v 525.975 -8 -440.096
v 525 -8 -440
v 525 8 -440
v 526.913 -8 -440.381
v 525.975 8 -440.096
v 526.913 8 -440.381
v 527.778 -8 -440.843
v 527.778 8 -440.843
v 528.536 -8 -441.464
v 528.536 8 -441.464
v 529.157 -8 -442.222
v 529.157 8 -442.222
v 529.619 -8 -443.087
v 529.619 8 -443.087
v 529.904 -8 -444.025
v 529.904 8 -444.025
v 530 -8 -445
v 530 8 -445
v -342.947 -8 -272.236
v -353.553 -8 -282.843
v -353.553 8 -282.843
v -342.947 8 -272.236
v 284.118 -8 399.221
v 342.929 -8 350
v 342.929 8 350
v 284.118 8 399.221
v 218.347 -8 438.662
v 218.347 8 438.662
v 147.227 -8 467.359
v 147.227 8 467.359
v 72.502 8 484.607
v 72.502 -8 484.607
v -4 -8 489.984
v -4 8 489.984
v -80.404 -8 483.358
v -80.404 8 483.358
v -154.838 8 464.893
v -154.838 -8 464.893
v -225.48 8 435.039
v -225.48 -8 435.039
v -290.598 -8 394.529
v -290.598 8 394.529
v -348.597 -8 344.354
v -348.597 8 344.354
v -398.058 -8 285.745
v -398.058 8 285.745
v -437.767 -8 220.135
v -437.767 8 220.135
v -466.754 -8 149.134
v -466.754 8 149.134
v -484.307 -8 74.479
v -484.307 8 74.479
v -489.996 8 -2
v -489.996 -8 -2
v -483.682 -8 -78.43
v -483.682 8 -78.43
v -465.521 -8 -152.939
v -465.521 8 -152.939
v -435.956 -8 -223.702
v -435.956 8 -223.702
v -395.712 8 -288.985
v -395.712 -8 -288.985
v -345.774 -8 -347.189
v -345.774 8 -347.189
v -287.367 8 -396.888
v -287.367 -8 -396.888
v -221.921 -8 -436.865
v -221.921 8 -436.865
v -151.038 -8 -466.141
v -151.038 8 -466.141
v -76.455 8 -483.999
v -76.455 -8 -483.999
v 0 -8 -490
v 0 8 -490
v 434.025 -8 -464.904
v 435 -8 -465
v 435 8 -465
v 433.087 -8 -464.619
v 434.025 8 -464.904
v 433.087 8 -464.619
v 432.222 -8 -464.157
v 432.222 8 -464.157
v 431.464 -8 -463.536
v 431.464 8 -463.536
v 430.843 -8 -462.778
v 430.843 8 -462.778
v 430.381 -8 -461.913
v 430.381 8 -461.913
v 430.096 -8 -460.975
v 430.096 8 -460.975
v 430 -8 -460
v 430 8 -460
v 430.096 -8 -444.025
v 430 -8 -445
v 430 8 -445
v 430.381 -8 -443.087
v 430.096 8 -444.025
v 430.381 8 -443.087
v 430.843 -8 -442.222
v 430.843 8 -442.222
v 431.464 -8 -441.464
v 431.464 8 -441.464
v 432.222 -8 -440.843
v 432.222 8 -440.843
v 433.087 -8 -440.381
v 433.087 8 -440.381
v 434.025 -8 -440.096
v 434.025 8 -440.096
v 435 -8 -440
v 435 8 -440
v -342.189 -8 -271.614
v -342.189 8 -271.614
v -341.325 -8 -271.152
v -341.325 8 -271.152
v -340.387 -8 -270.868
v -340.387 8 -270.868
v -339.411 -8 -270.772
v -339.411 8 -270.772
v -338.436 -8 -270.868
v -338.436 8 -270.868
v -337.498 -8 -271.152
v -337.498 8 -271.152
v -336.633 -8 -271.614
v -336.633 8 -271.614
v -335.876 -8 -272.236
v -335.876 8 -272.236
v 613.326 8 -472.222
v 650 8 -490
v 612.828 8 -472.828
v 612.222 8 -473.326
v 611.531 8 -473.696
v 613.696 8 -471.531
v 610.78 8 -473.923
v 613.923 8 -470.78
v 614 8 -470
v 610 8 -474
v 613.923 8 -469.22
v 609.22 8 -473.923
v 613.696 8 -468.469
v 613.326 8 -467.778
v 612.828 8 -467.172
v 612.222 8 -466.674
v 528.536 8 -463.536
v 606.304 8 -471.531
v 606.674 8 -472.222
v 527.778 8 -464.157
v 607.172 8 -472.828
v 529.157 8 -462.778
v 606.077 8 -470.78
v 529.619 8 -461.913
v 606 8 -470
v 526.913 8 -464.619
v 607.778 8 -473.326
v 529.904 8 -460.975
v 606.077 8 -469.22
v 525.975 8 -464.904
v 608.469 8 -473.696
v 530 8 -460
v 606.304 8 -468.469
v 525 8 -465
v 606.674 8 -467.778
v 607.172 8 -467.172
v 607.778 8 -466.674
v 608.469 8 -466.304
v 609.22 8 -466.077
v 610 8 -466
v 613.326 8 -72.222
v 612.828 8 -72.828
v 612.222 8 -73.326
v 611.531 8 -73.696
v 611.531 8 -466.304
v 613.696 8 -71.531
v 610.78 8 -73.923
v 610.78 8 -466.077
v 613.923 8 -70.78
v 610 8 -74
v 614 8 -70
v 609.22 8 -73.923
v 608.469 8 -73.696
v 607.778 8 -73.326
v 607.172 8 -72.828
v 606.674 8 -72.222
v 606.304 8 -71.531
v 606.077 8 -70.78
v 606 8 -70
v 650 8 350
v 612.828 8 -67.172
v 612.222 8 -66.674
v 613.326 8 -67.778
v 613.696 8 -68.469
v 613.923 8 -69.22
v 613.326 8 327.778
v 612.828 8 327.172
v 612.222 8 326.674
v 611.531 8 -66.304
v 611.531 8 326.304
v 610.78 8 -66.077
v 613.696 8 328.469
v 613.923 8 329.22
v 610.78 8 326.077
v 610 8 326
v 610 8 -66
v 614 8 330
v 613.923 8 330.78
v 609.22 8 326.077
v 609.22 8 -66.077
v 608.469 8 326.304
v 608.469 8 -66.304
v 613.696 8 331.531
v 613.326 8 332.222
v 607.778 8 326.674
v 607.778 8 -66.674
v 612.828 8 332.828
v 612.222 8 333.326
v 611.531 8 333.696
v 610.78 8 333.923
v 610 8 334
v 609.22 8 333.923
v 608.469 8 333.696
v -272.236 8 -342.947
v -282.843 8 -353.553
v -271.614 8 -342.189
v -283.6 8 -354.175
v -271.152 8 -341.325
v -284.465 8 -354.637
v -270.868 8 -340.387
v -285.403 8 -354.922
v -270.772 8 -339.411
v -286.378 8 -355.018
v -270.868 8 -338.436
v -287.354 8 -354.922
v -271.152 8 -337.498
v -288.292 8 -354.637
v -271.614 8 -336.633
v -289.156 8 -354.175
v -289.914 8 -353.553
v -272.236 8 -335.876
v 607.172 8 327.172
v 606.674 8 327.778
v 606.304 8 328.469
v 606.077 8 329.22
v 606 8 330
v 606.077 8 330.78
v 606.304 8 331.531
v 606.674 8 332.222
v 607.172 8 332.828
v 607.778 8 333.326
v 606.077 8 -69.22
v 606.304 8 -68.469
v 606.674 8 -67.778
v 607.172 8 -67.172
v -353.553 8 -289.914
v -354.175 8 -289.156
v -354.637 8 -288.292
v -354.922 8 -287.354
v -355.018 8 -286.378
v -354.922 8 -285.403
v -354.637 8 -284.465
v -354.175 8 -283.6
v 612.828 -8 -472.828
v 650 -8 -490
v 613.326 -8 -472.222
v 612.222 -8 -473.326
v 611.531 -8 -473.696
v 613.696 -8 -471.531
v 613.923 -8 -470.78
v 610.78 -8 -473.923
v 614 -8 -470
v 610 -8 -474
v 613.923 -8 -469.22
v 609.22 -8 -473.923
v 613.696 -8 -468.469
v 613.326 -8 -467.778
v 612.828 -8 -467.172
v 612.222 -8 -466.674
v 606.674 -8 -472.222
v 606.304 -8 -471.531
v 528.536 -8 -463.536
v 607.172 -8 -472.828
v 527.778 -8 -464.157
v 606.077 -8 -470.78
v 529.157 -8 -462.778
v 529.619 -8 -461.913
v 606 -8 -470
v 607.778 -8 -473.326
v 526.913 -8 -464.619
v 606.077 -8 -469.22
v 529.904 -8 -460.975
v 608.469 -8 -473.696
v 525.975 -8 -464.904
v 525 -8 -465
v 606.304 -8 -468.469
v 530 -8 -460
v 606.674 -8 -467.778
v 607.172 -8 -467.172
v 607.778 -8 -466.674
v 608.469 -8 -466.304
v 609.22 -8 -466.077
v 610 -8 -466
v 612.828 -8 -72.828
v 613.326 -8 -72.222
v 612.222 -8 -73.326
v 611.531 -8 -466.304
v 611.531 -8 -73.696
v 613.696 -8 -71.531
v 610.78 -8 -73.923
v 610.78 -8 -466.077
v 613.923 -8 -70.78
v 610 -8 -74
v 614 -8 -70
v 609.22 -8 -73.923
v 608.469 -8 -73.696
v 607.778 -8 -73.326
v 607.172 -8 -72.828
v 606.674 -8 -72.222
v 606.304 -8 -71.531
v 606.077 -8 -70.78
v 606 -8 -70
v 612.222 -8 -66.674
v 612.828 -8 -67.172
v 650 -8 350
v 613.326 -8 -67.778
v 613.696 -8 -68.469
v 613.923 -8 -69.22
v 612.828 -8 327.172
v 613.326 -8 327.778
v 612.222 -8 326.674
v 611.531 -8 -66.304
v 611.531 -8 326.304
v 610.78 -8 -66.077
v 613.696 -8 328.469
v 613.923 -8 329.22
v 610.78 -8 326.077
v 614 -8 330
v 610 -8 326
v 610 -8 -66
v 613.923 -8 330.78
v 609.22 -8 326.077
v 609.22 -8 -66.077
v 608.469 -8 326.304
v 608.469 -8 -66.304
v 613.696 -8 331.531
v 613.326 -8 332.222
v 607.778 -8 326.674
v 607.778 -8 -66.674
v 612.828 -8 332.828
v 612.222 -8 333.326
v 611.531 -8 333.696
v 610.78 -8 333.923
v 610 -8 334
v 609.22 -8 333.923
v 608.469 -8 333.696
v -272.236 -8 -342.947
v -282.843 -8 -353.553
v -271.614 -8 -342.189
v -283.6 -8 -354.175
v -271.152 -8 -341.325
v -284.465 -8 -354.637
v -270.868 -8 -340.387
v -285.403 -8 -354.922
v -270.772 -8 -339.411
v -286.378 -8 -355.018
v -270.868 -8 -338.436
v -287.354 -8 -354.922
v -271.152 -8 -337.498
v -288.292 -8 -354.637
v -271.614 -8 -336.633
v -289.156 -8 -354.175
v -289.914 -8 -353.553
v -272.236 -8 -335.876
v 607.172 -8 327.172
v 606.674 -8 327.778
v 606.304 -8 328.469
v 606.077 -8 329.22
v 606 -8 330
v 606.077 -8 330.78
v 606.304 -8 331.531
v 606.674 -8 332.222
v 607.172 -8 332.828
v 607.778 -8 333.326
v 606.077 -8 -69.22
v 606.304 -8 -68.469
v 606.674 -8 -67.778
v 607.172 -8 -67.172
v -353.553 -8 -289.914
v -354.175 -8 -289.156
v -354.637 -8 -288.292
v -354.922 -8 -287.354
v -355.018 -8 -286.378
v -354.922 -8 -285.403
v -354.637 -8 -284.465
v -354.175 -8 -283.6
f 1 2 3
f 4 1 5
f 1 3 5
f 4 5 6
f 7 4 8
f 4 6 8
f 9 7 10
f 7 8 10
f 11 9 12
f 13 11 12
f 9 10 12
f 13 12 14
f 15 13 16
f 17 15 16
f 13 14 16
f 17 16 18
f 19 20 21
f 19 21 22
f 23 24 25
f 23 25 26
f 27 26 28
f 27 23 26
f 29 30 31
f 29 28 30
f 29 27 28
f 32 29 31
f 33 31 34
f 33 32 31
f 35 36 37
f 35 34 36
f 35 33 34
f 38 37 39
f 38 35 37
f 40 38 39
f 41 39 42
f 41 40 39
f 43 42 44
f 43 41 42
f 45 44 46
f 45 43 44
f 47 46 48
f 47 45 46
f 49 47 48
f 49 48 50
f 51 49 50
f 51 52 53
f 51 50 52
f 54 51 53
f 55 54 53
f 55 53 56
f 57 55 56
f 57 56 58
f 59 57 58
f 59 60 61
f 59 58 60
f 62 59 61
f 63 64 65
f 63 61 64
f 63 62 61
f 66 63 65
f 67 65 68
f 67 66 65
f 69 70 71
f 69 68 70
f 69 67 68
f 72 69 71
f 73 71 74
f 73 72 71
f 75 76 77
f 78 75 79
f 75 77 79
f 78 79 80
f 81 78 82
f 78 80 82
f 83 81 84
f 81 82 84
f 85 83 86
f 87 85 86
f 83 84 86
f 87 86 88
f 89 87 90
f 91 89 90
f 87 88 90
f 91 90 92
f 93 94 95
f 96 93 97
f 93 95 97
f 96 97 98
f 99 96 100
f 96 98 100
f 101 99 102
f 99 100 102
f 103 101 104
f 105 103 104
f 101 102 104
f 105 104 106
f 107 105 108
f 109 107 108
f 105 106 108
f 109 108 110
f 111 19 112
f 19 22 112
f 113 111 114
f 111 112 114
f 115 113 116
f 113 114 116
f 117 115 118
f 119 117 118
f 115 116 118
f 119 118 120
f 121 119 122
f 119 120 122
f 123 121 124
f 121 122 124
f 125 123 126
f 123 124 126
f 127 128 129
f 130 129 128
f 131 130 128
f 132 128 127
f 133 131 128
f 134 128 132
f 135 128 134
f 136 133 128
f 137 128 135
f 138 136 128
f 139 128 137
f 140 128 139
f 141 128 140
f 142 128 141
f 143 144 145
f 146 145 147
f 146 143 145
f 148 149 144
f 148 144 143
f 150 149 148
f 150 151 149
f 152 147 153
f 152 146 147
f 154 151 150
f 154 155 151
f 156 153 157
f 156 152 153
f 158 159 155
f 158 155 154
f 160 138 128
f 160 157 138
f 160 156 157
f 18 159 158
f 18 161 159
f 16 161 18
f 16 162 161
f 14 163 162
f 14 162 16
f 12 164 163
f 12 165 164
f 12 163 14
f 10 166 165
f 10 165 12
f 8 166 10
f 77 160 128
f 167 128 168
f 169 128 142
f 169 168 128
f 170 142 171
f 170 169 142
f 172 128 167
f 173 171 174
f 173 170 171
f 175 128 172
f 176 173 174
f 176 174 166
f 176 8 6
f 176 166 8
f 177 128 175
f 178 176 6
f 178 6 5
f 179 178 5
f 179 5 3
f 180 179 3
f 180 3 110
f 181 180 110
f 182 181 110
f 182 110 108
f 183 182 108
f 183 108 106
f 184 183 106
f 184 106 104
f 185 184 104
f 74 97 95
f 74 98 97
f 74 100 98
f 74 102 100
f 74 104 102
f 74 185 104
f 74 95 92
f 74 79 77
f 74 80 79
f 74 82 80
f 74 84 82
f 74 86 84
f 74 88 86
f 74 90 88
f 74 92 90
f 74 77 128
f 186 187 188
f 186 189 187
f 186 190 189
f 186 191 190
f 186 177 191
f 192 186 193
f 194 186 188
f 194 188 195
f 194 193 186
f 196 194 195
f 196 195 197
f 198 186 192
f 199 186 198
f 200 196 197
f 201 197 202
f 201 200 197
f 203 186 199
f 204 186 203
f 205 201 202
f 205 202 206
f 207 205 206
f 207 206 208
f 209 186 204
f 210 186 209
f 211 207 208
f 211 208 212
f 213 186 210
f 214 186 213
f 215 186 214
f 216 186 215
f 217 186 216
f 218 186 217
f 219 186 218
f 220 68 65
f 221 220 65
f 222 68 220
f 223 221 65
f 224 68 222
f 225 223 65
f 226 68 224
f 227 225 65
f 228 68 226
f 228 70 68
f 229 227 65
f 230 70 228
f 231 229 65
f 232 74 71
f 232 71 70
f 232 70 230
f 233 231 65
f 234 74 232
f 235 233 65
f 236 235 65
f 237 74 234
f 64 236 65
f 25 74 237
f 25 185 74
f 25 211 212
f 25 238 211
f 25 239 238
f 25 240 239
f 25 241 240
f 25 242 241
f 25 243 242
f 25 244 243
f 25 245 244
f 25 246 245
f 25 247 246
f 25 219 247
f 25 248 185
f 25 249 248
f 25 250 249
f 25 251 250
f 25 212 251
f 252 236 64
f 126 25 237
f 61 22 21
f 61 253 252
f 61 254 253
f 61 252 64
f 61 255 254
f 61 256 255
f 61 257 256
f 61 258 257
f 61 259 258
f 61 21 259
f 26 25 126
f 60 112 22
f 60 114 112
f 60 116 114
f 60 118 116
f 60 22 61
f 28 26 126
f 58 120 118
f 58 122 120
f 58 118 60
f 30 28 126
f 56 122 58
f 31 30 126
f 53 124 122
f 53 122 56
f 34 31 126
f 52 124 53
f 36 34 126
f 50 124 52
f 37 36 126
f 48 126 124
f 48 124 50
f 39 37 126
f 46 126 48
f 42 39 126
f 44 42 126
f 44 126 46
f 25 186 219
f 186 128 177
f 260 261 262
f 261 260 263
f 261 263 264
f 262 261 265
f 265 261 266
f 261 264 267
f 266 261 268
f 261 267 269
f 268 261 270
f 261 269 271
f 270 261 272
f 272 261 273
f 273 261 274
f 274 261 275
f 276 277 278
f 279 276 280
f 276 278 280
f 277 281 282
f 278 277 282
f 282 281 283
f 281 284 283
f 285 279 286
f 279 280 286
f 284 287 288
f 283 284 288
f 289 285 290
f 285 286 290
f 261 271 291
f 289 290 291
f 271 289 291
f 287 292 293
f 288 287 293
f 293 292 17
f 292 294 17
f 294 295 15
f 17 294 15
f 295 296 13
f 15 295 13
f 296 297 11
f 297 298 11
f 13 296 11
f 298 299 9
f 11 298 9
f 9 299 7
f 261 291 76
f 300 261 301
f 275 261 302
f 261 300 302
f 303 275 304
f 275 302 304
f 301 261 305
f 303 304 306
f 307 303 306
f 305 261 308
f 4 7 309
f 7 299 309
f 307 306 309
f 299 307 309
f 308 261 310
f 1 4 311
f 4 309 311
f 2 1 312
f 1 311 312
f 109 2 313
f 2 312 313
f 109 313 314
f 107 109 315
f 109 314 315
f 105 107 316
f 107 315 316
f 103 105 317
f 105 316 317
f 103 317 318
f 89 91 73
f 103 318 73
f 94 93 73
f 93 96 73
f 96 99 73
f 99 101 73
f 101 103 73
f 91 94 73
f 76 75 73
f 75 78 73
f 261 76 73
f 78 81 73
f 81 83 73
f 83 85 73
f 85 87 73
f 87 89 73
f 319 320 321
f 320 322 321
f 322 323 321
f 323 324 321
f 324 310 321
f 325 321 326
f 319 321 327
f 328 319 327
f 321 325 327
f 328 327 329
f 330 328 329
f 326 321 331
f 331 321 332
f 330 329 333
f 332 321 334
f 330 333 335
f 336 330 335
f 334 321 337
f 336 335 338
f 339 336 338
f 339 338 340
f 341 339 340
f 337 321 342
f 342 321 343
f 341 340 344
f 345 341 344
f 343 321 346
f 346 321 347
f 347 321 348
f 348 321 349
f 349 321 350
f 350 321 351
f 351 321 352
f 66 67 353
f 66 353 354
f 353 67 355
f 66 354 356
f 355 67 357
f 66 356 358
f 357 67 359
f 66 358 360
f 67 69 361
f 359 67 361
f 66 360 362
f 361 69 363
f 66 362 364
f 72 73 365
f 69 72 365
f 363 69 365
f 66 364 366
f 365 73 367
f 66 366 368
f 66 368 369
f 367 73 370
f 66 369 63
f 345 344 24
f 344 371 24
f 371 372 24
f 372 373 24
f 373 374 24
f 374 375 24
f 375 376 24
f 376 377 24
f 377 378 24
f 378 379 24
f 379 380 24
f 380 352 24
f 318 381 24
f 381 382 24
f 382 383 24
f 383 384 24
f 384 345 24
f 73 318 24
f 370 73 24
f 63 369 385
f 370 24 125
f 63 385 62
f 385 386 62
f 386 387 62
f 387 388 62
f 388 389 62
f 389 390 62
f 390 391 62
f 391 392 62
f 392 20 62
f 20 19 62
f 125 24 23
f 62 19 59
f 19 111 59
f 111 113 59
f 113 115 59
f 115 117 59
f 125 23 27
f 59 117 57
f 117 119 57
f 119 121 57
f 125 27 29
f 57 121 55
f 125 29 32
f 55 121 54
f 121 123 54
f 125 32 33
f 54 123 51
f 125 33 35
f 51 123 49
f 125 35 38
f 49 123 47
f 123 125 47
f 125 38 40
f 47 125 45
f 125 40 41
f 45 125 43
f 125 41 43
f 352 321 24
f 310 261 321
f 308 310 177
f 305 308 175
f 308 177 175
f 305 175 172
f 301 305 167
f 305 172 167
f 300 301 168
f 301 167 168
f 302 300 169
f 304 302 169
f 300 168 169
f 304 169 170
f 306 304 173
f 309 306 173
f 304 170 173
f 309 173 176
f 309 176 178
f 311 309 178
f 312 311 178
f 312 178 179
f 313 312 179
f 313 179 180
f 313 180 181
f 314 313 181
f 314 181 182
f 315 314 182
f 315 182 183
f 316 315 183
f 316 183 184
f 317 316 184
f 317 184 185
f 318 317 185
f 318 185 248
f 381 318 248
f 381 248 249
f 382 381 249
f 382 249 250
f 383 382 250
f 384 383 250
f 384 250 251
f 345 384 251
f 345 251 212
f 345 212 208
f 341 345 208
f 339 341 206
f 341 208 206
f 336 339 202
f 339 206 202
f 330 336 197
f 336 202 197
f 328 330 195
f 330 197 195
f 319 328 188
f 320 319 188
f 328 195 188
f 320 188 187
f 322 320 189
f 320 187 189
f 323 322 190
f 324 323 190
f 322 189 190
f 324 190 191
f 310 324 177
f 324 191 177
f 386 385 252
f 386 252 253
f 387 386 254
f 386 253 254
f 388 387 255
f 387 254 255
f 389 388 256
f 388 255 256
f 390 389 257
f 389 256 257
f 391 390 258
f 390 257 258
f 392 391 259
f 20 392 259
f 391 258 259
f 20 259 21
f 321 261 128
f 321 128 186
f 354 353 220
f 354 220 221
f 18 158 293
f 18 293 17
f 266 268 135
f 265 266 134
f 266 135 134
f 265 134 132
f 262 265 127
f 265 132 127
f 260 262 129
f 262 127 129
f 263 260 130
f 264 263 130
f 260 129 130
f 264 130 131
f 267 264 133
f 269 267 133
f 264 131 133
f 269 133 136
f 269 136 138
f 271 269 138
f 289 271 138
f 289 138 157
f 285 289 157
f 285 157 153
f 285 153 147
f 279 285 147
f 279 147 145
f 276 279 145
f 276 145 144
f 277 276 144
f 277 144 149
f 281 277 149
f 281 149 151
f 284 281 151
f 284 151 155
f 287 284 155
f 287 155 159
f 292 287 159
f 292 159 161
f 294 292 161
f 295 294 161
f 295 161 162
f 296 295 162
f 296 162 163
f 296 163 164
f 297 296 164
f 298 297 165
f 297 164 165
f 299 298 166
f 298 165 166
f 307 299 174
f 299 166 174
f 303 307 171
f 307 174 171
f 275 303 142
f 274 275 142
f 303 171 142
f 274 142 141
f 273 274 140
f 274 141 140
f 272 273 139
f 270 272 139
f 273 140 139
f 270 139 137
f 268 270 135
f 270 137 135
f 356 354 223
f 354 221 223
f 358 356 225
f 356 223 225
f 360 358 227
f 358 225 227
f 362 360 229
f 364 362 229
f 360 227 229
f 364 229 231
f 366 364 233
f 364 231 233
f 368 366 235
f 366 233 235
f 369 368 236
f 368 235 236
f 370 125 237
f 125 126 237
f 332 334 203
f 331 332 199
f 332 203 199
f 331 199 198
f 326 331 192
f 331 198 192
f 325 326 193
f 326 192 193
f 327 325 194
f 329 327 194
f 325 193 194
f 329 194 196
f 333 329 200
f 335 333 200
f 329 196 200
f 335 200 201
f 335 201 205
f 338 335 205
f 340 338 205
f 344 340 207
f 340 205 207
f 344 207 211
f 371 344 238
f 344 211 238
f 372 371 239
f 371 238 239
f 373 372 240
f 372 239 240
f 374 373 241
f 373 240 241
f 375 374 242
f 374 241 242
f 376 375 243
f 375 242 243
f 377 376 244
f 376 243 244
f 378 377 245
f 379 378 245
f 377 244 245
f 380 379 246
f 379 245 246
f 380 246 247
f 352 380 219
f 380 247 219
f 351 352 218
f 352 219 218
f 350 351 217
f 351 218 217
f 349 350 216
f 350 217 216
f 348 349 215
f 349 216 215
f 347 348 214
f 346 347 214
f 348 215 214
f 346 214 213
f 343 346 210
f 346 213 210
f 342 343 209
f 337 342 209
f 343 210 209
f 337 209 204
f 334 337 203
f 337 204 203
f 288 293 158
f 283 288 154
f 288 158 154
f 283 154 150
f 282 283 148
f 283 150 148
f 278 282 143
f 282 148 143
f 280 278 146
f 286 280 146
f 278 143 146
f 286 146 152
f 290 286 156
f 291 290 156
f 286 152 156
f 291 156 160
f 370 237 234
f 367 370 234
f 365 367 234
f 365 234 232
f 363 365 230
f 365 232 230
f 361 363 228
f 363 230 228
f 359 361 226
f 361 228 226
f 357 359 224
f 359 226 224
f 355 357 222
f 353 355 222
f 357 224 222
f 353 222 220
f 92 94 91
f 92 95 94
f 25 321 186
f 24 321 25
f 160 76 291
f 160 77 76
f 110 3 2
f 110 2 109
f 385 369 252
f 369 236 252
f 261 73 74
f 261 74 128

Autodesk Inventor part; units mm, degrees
ref_plane "YZ Plane" through (0, 0, 0) normal (1, 0, 0) x (0, 1, 0)
ref_plane "XZ Plane" through (0, 0, 0) normal (0, 1, 0) x (-1, 0, 0)
ref_plane "XY Plane" through (0, 0, 0) normal (0, 0, 1) x (1, 0, 0)
sketch "Sketch1" plane through (0, 0, 0) normal (0, 1, 0) x (-1, 0, 0)
  arc A0 (0, -490) -> (-342.9286, 350) centre (0, 0) ccw
  line L0 (0, -490) -> (-650, -490)
  line L1 (-650, -490) -> (-650, 350)
  line L2 (-650, 350) -> (-342.9286, 350)
  dimension "d1" = 980
  dimension "d2" = 350
  dimension "d3" = 650
extrude "Extrusion1" add sketch "Sketch1" along normal mid plane 16
sketch "Sketch2" plane through (0, 8, 0) normal (0, 1, 0) x (1, 0, 0)
  arc A0 (0, 490) -> (342.9286, -350) centre (0, 0) ccw projected
  line L0 (650, -350) -> (650, 490) projected
  line L1 (650, 490) -> (0, 490) projected
  line L2 (435, 465) -> (525, 465)
  line L3 (530, 460) -> (530, 445)
  line L4 (525, 440) -> (435, 440)
  line L5 (430, 445) -> (430, 460)
  arc A1 (435, 465) -> (430, 460) centre (435, 460) ccw
  arc A2 (430, 445) -> (435, 440) centre (435, 445) ccw
  arc A3 (525, 440) -> (530, 445) centre (525, 445) ccw
  arc A4 (530, 460) -> (525, 465) centre (525, 460) ccw
  line L6 (0, 0) -> (-346.4823, 346.4823) construction
  line L7 (-289.9138, 353.5534) -> (-353.5534, 289.9138)
  line L8 (-353.5534, 282.8427) -> (-342.9468, 272.2361)
  line L9 (-335.8757, 272.2361) -> (-272.2361, 335.8757)
  line L10 (-272.2361, 342.9468) -> (-282.8427, 353.5534)
  arc A5 (-353.5534, 289.9138) -> (-353.5534, 282.8427) centre (-350.0179, 286.3782) ccw
  arc A6 (-342.9468, 272.2361) -> (-335.8757, 272.2361) centre (-339.4113, 275.7716) ccw
  arc A7 (-272.2361, 335.8757) -> (-272.2361, 342.9468) centre (-275.7716, 339.4113) ccw
  arc A8 (-282.8427, 353.5534) -> (-289.9138, 353.5534) centre (-286.3782, 350.0179) ccw
  point P0 (430, 465)
  point P1 (530, 465)
  point P2 (430, 440)
  dimension "d6" = 100
  dimension "d7" = 25
  dimension "d8" = 25
  dimension "d9" = 120
  dimension "d10" = 5
  dimension "d11" = 45
  dimension "d15" = 25
  dimension "d16" = 100
  dimension "d17" = 430
  dimension "d18" = 90
  dimension "d19" = 5
extrude "Extrusion2" cut sketch "Sketch2" against normal through all
sketch "Sketch3" plane through (0, 8, 0) normal (0, 1, 0) x (1, 0, 0)
  circle A0 centre (610, 470) radius 4
  circle A1 centre (610, -330) radius 4
  circle A2 centre (610, 70) radius 4
  circle A3 centre (610, 470) radius 2.75 projected
  circle A4 centre (610, 70) radius 2.75 projected
  circle A5 centre (610, -330) radius 2.75 projected
  dimension "d22" = 8
extrude "Extrusion3" cut sketch "Sketch3" against normal through all contours A0 | A1 | A2 | A3 | A4 | A5
ref_plane "Work Plane1" through (0, 0, 0) normal (-0.7071, 0, -0.7071) x (-0.7071, 0, 0.7071)
ref_plane "Work Plane2" through (500, 8, 350) normal (1, 0, 0) x (0, 0, -1)
ref_plane "Work Plane3" through (342.9286, 8, 180) normal (0, 0, 1) x (1, 0, 0)
sketch "Sketch5" plane through (0, -8, 0) normal (0, -1, 0) x (1, 0, 0)
  circle A0 centre (610, 330) radius 4 projected
  circle A1 centre (610, -470) radius 4 projected
  circle A2 centre (610, -70) radius 4 projected
  arc A3 (435, -440) -> (430, -445) centre (435, -445) ccw projected
  line L0 (435, -440) -> (525, -440) projected
  arc A4 (530, -445) -> (525, -440) centre (525, -445) ccw projected
  line L1 (530, -445) -> (530, -460) projected
  arc A5 (525, -465) -> (530, -460) centre (525, -460) ccw projected
  line L2 (525, -465) -> (435, -465) projected
  arc A6 (430, -460) -> (435, -465) centre (435, -460) ccw projected
  line L3 (430, -460) -> (430, -445) projected
  arc A7 (-335.8757, -272.2361) -> (-342.9468, -272.2361) centre (-339.4113, -275.7716) ccw projected
  line L4 (-335.8757, -272.2361) -> (-272.2361, -335.8757) projected
  arc A8 (-272.2361, -342.9468) -> (-272.2361, -335.8757) centre (-275.7716, -339.4113) ccw projected
  line L5 (-272.2361, -342.9468) -> (-282.8427, -353.5534) projected
  arc A9 (-289.9138, -353.5534) -> (-282.8427, -353.5534) centre (-286.3782, -350.0179) ccw projected
  line L6 (-289.9138, -353.5534) -> (-353.5534, -289.9138) projected
  arc A10 (-353.5534, -282.8427) -> (-353.5534, -289.9138) centre (-350.0179, -286.3782) ccw projected
  line L7 (-353.5534, -282.8427) -> (-342.9468, -272.2361) projected
  arc A11 (342.9286, 350) -> (0, -490) centre (0, 0) ccw projected
  line L8 (0, -490) -> (650, -490) projected
  line L9 (650, -490) -> (650, 350) projected
  line L10 (650, 350) -> (342.9286, 350) projected
  line L11 (0, 0) -> (650, 0) construction
  line L12 (0, 0) -> (0, -490) construction
properties part number "Base_Left" material "MDF Medium Density Fiberboard"
